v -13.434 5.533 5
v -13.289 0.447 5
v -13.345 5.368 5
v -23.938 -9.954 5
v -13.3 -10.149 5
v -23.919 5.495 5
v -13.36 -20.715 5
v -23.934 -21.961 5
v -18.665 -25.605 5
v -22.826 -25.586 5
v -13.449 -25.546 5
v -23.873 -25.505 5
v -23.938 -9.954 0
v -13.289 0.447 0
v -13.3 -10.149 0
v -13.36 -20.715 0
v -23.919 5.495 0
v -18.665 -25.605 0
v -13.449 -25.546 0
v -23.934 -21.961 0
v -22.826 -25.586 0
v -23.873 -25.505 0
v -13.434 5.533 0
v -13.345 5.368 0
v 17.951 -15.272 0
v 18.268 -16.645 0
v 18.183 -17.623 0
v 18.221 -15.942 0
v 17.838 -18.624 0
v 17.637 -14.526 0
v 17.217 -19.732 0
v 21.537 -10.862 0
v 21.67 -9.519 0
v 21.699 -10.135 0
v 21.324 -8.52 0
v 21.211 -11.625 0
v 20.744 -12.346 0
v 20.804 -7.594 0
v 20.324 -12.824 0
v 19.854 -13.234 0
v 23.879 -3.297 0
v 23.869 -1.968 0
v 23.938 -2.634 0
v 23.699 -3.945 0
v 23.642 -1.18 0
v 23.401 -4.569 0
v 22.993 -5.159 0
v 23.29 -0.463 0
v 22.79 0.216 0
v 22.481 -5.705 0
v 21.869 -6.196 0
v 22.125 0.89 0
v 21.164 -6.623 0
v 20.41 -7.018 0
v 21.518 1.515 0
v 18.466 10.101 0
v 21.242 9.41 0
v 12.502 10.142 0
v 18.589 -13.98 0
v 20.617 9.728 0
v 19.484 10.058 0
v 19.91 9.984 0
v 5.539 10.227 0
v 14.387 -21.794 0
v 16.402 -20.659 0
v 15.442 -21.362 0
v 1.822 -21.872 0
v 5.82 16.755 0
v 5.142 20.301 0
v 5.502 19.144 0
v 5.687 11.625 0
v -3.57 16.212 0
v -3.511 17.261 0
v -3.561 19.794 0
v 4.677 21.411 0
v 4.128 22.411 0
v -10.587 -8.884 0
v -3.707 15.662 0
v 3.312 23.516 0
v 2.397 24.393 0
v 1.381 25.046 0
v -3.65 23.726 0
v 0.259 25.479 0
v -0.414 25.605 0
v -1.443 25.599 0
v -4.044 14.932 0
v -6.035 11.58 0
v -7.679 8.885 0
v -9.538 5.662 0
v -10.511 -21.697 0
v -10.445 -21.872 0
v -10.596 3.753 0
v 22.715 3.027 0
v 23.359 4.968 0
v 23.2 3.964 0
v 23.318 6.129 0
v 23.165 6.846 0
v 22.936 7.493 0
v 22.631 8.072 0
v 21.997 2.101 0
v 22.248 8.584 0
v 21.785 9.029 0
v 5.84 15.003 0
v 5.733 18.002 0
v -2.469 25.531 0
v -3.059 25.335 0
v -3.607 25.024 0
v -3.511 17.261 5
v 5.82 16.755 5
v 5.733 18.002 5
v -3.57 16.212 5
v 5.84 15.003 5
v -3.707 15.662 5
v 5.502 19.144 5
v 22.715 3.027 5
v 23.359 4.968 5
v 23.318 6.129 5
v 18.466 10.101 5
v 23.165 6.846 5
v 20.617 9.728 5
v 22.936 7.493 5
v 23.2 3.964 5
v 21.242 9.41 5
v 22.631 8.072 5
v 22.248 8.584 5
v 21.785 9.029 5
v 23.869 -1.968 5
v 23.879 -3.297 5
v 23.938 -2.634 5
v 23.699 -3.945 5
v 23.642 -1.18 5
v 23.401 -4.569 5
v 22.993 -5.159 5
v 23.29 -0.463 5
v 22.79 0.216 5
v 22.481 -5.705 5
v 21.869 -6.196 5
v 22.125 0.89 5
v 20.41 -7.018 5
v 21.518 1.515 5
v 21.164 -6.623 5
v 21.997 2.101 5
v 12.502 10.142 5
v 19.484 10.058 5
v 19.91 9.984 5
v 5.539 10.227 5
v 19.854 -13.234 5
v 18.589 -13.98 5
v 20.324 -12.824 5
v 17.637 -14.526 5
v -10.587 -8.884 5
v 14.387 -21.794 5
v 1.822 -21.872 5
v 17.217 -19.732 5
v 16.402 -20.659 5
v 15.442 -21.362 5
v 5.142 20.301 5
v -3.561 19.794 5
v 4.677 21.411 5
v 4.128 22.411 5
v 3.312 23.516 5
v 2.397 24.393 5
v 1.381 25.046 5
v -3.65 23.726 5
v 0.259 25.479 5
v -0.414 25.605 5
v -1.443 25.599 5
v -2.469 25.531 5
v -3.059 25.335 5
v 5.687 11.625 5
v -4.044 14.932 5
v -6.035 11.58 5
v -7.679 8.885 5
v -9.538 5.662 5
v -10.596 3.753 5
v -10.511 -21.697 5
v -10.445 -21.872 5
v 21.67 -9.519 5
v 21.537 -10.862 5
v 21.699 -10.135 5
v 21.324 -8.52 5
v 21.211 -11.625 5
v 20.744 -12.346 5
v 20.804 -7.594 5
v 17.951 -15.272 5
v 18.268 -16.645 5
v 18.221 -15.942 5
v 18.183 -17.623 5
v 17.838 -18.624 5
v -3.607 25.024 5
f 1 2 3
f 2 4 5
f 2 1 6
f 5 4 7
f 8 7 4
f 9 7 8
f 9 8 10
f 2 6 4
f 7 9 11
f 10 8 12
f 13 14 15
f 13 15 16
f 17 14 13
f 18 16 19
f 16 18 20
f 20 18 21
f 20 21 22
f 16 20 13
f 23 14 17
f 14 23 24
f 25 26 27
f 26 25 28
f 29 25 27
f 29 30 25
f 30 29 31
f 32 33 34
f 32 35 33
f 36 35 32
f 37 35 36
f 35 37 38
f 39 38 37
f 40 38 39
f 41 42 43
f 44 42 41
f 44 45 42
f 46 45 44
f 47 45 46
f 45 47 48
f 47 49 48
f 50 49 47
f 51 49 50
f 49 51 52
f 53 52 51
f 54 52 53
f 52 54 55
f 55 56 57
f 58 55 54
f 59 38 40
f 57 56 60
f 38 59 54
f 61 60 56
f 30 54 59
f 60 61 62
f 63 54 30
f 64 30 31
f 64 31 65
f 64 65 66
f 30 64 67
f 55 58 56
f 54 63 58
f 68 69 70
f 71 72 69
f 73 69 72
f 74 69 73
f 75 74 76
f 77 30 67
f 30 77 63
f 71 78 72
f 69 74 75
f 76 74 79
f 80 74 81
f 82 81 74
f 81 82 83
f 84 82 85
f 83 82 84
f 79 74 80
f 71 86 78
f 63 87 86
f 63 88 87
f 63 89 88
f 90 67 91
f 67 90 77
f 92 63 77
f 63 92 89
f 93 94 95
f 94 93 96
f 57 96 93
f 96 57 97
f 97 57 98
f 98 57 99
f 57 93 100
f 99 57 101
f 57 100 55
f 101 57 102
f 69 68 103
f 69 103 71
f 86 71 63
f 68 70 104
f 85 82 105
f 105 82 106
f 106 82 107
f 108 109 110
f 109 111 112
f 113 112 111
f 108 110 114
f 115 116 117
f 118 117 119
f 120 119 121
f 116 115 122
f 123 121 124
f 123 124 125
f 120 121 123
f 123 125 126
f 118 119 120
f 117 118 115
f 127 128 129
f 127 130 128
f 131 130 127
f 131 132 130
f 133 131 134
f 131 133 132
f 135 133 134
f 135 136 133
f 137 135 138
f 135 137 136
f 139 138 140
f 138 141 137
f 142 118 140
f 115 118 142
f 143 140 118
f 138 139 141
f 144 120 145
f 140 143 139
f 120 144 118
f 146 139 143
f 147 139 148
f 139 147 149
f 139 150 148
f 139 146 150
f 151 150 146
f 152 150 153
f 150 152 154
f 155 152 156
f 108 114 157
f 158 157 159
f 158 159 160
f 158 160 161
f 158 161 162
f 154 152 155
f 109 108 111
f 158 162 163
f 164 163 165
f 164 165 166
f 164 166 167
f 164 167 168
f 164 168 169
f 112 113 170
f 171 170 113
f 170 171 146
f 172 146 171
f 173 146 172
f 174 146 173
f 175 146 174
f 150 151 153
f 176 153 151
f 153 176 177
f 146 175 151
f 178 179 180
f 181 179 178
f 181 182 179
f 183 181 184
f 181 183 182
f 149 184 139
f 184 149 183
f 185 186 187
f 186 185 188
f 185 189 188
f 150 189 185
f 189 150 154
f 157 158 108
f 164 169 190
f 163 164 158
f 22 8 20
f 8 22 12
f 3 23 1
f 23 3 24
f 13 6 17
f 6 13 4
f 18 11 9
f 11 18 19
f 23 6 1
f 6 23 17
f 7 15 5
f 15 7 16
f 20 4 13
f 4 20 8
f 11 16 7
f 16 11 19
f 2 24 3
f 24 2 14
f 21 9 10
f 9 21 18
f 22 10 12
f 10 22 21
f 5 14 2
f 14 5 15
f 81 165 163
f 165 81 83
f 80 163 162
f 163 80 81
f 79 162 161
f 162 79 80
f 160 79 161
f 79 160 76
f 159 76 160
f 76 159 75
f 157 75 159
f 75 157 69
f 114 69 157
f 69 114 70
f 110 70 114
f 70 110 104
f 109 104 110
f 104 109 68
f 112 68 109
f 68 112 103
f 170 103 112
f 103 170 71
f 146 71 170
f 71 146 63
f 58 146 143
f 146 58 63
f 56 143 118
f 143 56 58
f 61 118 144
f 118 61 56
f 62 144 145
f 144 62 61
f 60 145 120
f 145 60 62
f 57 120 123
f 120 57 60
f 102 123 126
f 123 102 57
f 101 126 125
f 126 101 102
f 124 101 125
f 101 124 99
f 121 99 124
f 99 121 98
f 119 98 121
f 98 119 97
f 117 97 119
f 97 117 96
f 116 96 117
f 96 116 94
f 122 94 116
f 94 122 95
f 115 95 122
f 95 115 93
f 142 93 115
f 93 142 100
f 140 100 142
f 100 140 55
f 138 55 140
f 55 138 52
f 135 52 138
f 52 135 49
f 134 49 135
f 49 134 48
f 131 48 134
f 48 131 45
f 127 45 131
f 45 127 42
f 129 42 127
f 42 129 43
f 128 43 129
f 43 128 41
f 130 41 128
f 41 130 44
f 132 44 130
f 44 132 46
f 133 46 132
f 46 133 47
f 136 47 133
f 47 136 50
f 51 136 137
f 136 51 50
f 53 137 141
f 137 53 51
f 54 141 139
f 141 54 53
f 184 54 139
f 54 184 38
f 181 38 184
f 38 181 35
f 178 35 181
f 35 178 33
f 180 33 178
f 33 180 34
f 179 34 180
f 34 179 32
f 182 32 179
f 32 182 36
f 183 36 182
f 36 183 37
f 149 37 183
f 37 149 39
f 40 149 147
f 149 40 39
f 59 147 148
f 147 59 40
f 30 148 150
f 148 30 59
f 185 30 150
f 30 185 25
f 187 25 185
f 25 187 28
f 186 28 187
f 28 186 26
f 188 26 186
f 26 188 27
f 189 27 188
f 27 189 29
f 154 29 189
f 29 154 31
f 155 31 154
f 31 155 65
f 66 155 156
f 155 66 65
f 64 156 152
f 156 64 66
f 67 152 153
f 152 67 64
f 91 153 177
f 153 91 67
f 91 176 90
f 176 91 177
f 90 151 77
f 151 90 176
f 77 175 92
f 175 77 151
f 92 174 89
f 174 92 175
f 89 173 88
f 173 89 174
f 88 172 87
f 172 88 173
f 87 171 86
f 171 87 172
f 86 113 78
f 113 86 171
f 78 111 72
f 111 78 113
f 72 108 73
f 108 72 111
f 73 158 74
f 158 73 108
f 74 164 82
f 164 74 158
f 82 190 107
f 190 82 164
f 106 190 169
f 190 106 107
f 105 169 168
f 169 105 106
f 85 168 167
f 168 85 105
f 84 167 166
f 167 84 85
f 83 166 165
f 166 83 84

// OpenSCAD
// Module names are of the form poly_<inkscape-path-id>().  As a result,
// you can associate a polygon in this OpenSCAD program with the corresponding
// SVG element in the Inkscape document by looking for the XML element with
// the attribute id="inkscape-path-id".

// fudge value is used to ensure that subtracted solids are a tad taller
// in the z dimension than the polygon being subtracted from.  This helps
// keep the resulting .stl file manifold.
fudge = 0.1;

module poly_path3776(h)
{
  scale([25.4/90, -25.4/90, 1]) union()
  {
    linear_extrude(height=h)
      polygon([[-84.498884,90.134308],[-84.556724,35.299408],[-84.488874,-19.204752],[-66.261945,-19.272752],[-51.736483,-19.258544],[-47.639022,-19.012092],[-47.433707,-17.104320],[-47.332084,-9.592100],[-47.375492,35.593598],[-47.691632,90.167828],[-53.536814,90.417914],[-66.135700,90.491575],[-78.714364,90.394987],[-84.498878,90.134328]]);
    linear_extrude(height=h)
      polygon([[-36.938332,76.772848],[-37.128462,31.330658],[-37.128462,-13.648502],[-33.331432,-20.395382],[-23.641552,-36.799552],[-16.034376,-49.370238],[-13.425342,-54.096598],[-12.654847,-56.159504],[-12.262227,-58.775580],[-12.346962,-69.411621],[-12.659322,-83.655936],[-12.631448,-86.704873],[-12.389901,-88.311817],[-11.686548,-89.108392],[-10.273252,-89.726226],[-8.141508,-90.226960],[-5.248425,-90.478640],[-2.208766,-90.457387],[0.362708,-90.139325],[3.470469,-89.133929],[6.425623,-87.555770],[9.194504,-85.444220],[11.743451,-82.838652],[14.038800,-79.778437],[16.046888,-76.302948],[17.734052,-72.451556],[19.066628,-68.263634],[20.182475,-62.368259],[20.418408,-53.624465],[20.304545,-46.701287],[19.881038,-41.288095],[19.472398,-36.094772],[24.555194,-35.811850],[44.285288,-35.684142],[68.969458,-35.608942],[71.086118,-34.882742],[74.413265,-33.470469],[77.077813,-31.712980],[79.175810,-29.530817],[80.803308,-26.844522],[81.905928,-23.725402],[82.483335,-20.271699],[82.500533,-16.885920],[81.922528,-13.970572],[80.146776,-10.704945],[77.309618,-7.089992],[75.650948,-5.293962],[78.315228,-2.780622],[82.057998,1.376468],[83.509428,4.214344],[84.326834,7.248962],[84.482194,10.304886],[83.947488,13.206678],[82.511654,16.422484],[80.390488,19.211651],[77.543546,21.616461],[73.930388,23.679198],[72.012158,24.728628],[73.332088,26.803238],[75.244740,30.089832],[76.388688,33.358268],[76.694958,35.148117],[76.385688,37.062428],[75.489446,39.787998],[74.099479,42.384192],[72.290728,44.735104],[70.138138,46.724828],[66.979041,48.652857],[62.928188,50.609168],[61.956668,51.167498],[62.852938,53.099668],[63.949427,55.620260],[64.495370,57.864592],[64.524522,60.095370],[64.070638,62.575298],[63.254984,65.103456],[62.144169,67.495686],[60.772999,69.713350],[59.176280,71.717805],[57.388819,73.470410],[55.445420,74.932525],[53.380891,76.065508],[51.230038,76.830718],[42.564728,77.166701],[6.462558,77.235848],[-30.510634,77.168708],[-35.834474,77.030092],[-36.939662,76.772828]]);
  }
}

module poly_path3774(h)
{
  scale([25.4/90, -25.4/90, 1]) union()
  {
    linear_extrude(height=h)
      polygon([[-84.459882,89.783738],[-84.613533,35.432048],[-84.407382,-18.734752],[-80.434625,-18.994767],[-66.116549,-19.079762],[-47.804812,-18.874442],[-47.645012,35.710148],[-47.711812,90.068158],[-66.005214,90.136058],[-81.369191,90.125125],[-83.836653,90.007413],[-84.459901,89.783688]]);
    linear_extrude(height=h)
      polygon([[-36.815992,76.798688],[-36.996172,31.583698],[-36.996172,-13.451112],[-35.380432,-16.327932],[-31.717702,-22.918262],[-22.178502,-38.925552],[-13.545372,-53.600589],[-12.626420,-55.859496],[-12.142931,-58.337613],[-12.132332,-67.359513],[-12.618722,-84.271937],[-12.577894,-87.305627],[-12.365162,-88.292954],[-10.452880,-89.402569],[-7.437662,-90.215793],[-3.737748,-90.479721],[-0.206958,-90.106425],[3.137039,-89.107084],[6.276571,-87.492876],[9.193971,-85.274981],[11.871566,-82.464577],[14.291689,-79.072845],[16.436668,-75.110963],[18.485396,-69.762851],[19.865118,-63.737753],[20.302233,-59.318794],[20.456326,-53.668815],[20.325365,-47.800722],[19.907318,-42.727418],[19.227818,-37.270532],[19.059438,-35.757142],[43.352998,-35.670842],[59.101550,-35.594160],[67.312606,-35.356189],[71.212721,-34.725439],[74.028448,-33.470422],[76.029164,-32.308538],[77.754857,-30.923239],[79.204628,-29.316211],[80.377574,-27.489140],[81.272796,-25.443715],[81.889392,-23.181620],[82.283108,-18.014172],[82.072764,-15.172179],[81.351798,-13.190932],[79.703754,-10.272129],[77.333438,-7.390272],[75.716358,-5.381972],[78.727318,-2.115242],[80.843088,0.154713],[82.317069,2.150460],[83.326142,4.157113],[84.047188,6.459788],[84.402374,8.856854],[84.283308,11.231972],[83.709284,13.550831],[82.699595,15.779122],[81.273535,17.882534],[79.450398,19.826756],[77.249478,21.577477],[74.690068,23.100388],[71.747608,24.705818],[73.212318,26.932438],[74.911397,29.720017],[75.977293,32.254077],[76.430161,34.599391],[76.290158,36.820728],[75.668102,38.988411],[74.672786,41.110777],[73.321931,43.156342],[71.633258,45.093618],[69.213930,47.239295],[65.712968,49.105198],[62.807994,50.614383],[61.966488,51.391838],[62.618238,53.000478],[63.925297,56.084114],[64.335473,59.358602],[63.848521,62.845495],[62.464198,66.566348],[60.732153,69.543729],[58.571330,72.156242],[56.047586,74.336514],[53.226778,76.017168],[51.506988,76.838958],[7.435598,76.908858],[-36.815962,76.798618]]);
  }
}

module poly_path3770(h)
{
  scale([25.4/90, -25.4/90, 1]) union()
  {
    linear_extrude(height=h)
      polygon([[-84.092005,35.563998],[-84.092005,-18.811552],[-66.034193,-18.743552],[-47.976382,-18.675552],[-47.976382,35.564038],[-47.976382,89.803618],[-66.034193,89.871618],[-84.092005,89.939618]]);
    linear_extrude(height=h)
      polygon([[-36.596272,75.849888],[-36.674972,30.669198],[-36.599272,-13.648502],[-32.865902,-20.263092],[-26.146662,-31.772462],[-13.290002,-53.255221],[-12.312993,-55.537670],[-11.819096,-58.162264],[-11.706572,-62.256137],[-11.873682,-68.946423],[-12.225422,-83.450913],[-12.234929,-86.456341],[-12.046104,-87.977760],[-11.414150,-88.677641],[-10.094272,-89.218459],[-7.721293,-89.803867],[-4.770346,-90.043479],[-1.696112,-89.927934],[1.046728,-89.447869],[4.145233,-88.287169],[7.047621,-86.573394],[9.732508,-84.333996],[12.178506,-81.596428],[14.364232,-78.388142],[16.268300,-74.736590],[17.869323,-70.669225],[19.145918,-66.213499],[19.620321,-62.811798],[19.816558,-55.188089],[19.821538,-47.007224],[19.343398,-41.074429],[18.921464,-36.618448],[19.119698,-35.456082],[43.382198,-35.216102],[66.961060,-34.994135],[70.873603,-34.443228],[73.543348,-33.350972],[76.204450,-31.744493],[78.427178,-29.635180],[80.170903,-27.070908],[81.394998,-24.099552],[81.983878,-19.733922],[81.898339,-16.394364],[81.165006,-13.519877],[79.642687,-10.757634],[77.190188,-7.754812],[75.187178,-5.349322],[77.943738,-2.474022],[81.446368,1.387357],[82.487455,3.106559],[83.283428,5.004618],[83.839379,7.045170],[84.001828,9.237948],[83.768137,12.026722],[82.976593,14.533166],[81.560111,16.905543],[79.451608,19.292118],[77.069785,21.387078],[74.327288,22.936248],[71.483018,24.637698],[72.771668,26.814398],[74.769091,30.133242],[75.871818,33.158768],[76.174605,34.890265],[75.991618,36.542958],[75.310495,38.979885],[74.251293,41.239778],[72.792272,43.360441],[70.911698,45.379678],[68.357084,47.407618],[64.545508,49.334578],[61.572198,50.976398],[62.321158,53.105748],[63.791924,56.730816],[63.990938,59.884298],[63.605699,62.415451],[62.845006,64.902414],[61.746330,67.292787],[60.347140,69.534170],[58.684908,71.574161],[56.797103,73.360360],[54.721196,74.840366],[52.494658,75.961778],[50.977808,76.574408],[7.267978,76.643608],[-36.441852,76.712808]]);
  }
}

module poly_path3772(h)
{
  scale([25.4/90, -25.4/90, 1]) union()
  {
    linear_extrude(height=h)
      polygon([[-84.233597,89.871558],[-84.292147,35.299408],[-84.224297,-18.940172],[-66.039691,-19.008172],[-47.855082,-19.076172],[-47.687322,-18.407732],[-47.747922,36.164408],[-47.976342,90.068098],[-66.041752,90.136098],[-80.467181,90.122862],[-84.233557,89.871508]]);
    linear_extrude(height=h)
      polygon([[-36.671992,76.512848],[-36.863882,31.330658],[-36.863882,-13.383922],[-33.191992,-19.998502],[-25.809212,-32.686762],[-13.213832,-53.813751],[-12.399202,-55.940477],[-11.989900,-58.671984],[-12.079322,-70.470711],[-12.395992,-84.902205],[-12.389992,-88.422574],[-10.940962,-89.085961],[-7.516171,-90.029422],[-2.868842,-90.180680],[0.106771,-89.863648],[2.783481,-89.127402],[5.353053,-87.900173],[8.007248,-86.110195],[10.074666,-84.290574],[12.029769,-82.078232],[15.484341,-76.701811],[18.133577,-70.433792],[19.740088,-63.727035],[20.084508,-59.335276],[20.176065,-53.355043],[19.626048,-41.575176],[18.952548,-36.470522],[19.165598,-35.792762],[25.092629,-35.543485],[44.114638,-35.408352],[59.798080,-35.340216],[67.779511,-35.126895],[71.404341,-34.536765],[74.017978,-33.338202],[77.317090,-31.134138],[79.797280,-28.173099],[81.437969,-24.488277],[82.218578,-20.112862],[82.149761,-16.767382],[81.387924,-13.711478],[79.875204,-10.793186],[77.553738,-7.860542],[75.451678,-5.368152],[78.430598,-2.263352],[80.988083,0.422455],[82.391828,2.515468],[83.753993,5.942577],[84.176468,9.359688],[83.929436,12.131413],[83.154106,14.593822],[81.768080,16.929877],[79.688958,19.322538],[77.332428,21.448907],[74.591778,23.008148],[71.747508,24.762928],[72.939198,26.730268],[74.936864,30.079565],[76.103958,33.448458],[76.226555,36.259426],[75.477263,39.179212],[73.891915,42.117904],[71.506348,44.985588],[69.023008,47.203072],[65.574808,49.062828],[61.794098,51.161208],[62.730248,53.546328],[63.815726,56.164674],[64.264861,58.663815],[64.089665,61.267545],[63.302148,64.199658],[61.527604,68.074392],[59.086124,71.430372],[56.077008,74.156793],[52.599558,76.142848],[50.977708,76.838998],[7.248778,76.909698],[-30.242749,76.903327],[-35.582260,76.771983],[-36.672072,76.512828]]);
  }
}

module poly_path3768(h)
{
  scale([25.4/90, -25.4/90, 1]) union()
  {
    linear_extrude(height=h)
      polygon([[-83.827422,35.565858],[-83.827422,-18.543302],[-65.967412,-18.543302],[-48.107402,-18.543302],[-48.174202,35.497848],[-48.241002,89.538998],[-66.034233,89.606998],[-83.827462,89.674998]]);
    linear_extrude(height=h)
      polygon([[-36.336712,75.846808],[-36.407912,30.933788],[-36.334712,-13.383922],[-34.722712,-16.294342],[-26.139632,-31.243302],[-20.251252,-40.900589],[-14.729361,-50.072263],[-13.113192,-53.112326],[-12.096561,-55.640617],[-11.556735,-58.046197],[-11.370979,-60.718124],[-11.570742,-68.417256],[-11.943262,-87.001970],[-11.605841,-88.110133],[-10.401922,-88.803000],[-6.373812,-89.733611],[-3.754005,-89.873386],[-1.195424,-89.655279],[1.289044,-89.085250],[3.686510,-88.169263],[5.984087,-86.913279],[8.168885,-85.323260],[10.228018,-83.405169],[12.148598,-81.164968],[14.544188,-77.467401],[16.383698,-73.968714],[17.325348,-71.442229],[18.627515,-66.990734],[19.507958,-61.934964],[19.866145,-53.239755],[19.481458,-44.472464],[18.724888,-37.489824],[18.791158,-35.410522],[41.369588,-35.186282],[66.455898,-34.941422],[69.961605,-34.329461],[73.069073,-33.282674],[75.717466,-31.827509],[77.845948,-29.990412],[79.538606,-27.693457],[80.775080,-25.023420],[81.534783,-22.038606],[81.797128,-18.797322],[81.581876,-16.002077],[80.846298,-13.510874],[79.473654,-11.049660],[77.347208,-8.344382],[75.699184,-6.442208],[75.205555,-5.266013],[75.946152,-4.038932],[78.000808,-1.984102],[80.736092,1.027855],[82.516531,3.750853],[83.475757,6.449334],[83.747398,9.387738],[83.564968,11.634477],[83.022816,13.673863],[82.065426,15.654742],[80.637278,17.725958],[77.858264,20.482903],[73.930378,22.793778],[72.090710,23.746093],[71.311070,24.512562],[71.466864,25.429382],[72.433498,26.832748],[74.496969,30.273201],[75.712318,33.717268],[75.811055,35.915811],[75.305590,38.281982],[74.224114,40.730239],[72.594818,43.175038],[69.995311,45.827267],[67.381938,47.715418],[64.005568,49.287838],[61.260168,50.909188],[62.019368,53.105978],[63.516268,56.688320],[63.725508,59.884298],[63.304786,62.528805],[62.464205,65.124363],[61.253570,67.605806],[59.722686,69.907970],[57.921360,71.965688],[55.899396,73.713795],[53.706600,75.087127],[51.392778,76.020518],[49.326952,76.245921],[43.141340,76.373121],[6.881678,76.442118],[-36.192352,76.442118]]);
  }
}

module poly_path3766(h)
{
  scale([25.4/90, -25.4/90, 1]) union()
  {
    difference()
    {
       linear_extrude(height=h)
         polygon([[-83.827422,35.565858],[-83.827422,-18.543302],[-65.967412,-18.543302],[-48.107402,-18.543302],[-48.174202,35.497848],[-48.241002,89.538998],[-66.034233,89.606998],[-83.827462,89.674998]]);
       translate([0, 0, -fudge])
         linear_extrude(height=h+2*fudge)
           polygon([[-48.802702,89.194658],[-48.590642,-2.868642],[-48.637842,-18.282522],[-66.034193,-18.214522],[-83.430547,-18.146522],[-83.499807,35.414068],[-83.488541,78.319245],[-83.235224,89.190158],[-65.927530,89.388550],[-48.802702,89.194158]]);
    }
    difference()
    {
       linear_extrude(height=h)
         polygon([[-36.336712,75.846808],[-36.407912,30.933788],[-36.334712,-13.383922],[-34.722712,-16.294342],[-26.139632,-31.243302],[-20.251252,-40.900589],[-14.729361,-50.072263],[-13.113192,-53.112326],[-12.096561,-55.640617],[-11.556735,-58.046197],[-11.370979,-60.718124],[-11.570742,-68.417256],[-11.943262,-87.001970],[-11.605841,-88.110133],[-10.401922,-88.803000],[-6.373812,-89.733611],[-3.754005,-89.873386],[-1.195424,-89.655279],[1.289044,-89.085250],[3.686510,-88.169263],[5.984087,-86.913279],[8.168885,-85.323260],[10.228018,-83.405169],[12.148598,-81.164968],[14.544188,-77.467401],[16.383698,-73.968714],[17.325348,-71.442229],[18.627515,-66.990734],[19.507958,-61.934964],[19.866145,-53.239755],[19.481458,-44.472464],[18.724888,-37.489824],[18.791158,-35.410522],[41.369588,-35.186282],[66.455898,-34.941422],[69.961605,-34.329461],[73.069073,-33.282674],[75.717466,-31.827509],[77.845948,-29.990412],[79.538606,-27.693457],[80.775080,-25.023420],[81.534783,-22.038606],[81.797128,-18.797322],[81.581876,-16.002077],[80.846298,-13.510874],[79.473654,-11.049660],[77.347208,-8.344382],[75.699184,-6.442208],[75.205555,-5.266013],[75.946152,-4.038932],[78.000808,-1.984102],[80.736092,1.027855],[82.516531,3.750853],[83.475757,6.449334],[83.747398,9.387738],[83.564968,11.634477],[83.022816,13.673863],[82.065426,15.654742],[80.637278,17.725958],[77.858264,20.482903],[73.930378,22.793778],[72.090710,23.746093],[71.311070,24.512562],[71.466864,25.429382],[72.433498,26.832748],[74.496969,30.273201],[75.712318,33.717268],[75.811055,35.915811],[75.305590,38.281982],[74.224114,40.730239],[72.594818,43.175038],[69.995311,45.827267],[67.381938,47.715418],[64.005568,49.287838],[61.260168,50.909188],[62.019368,53.105978],[63.516268,56.688320],[63.725508,59.884298],[63.304786,62.528805],[62.464205,65.124363],[61.253570,67.605806],[59.722686,69.907970],[57.921360,71.965688],[55.899396,73.713795],[53.706600,75.087127],[51.392778,76.020518],[49.326952,76.245921],[43.141340,76.373121],[6.881678,76.442118],[-36.192352,76.442118]]);
       translate([0, 0, -fudge])
         linear_extrude(height=h+2*fudge)
           polygon([[50.316328,75.885408],[52.488428,75.105128],[53.699078,74.590018],[54.814248,73.928558],[55.720258,73.264278],[57.237509,72.097891],[59.356958,69.827518],[60.923109,67.381511],[62.259228,64.398497],[63.190744,61.343324],[63.543088,58.680838],[62.921731,56.113213],[62.391955,54.962280],[61.938598,54.481678],[61.693408,53.873138],[61.416838,52.988028],[61.086118,51.572498],[61.231998,50.468387],[62.487158,49.557498],[64.373008,48.671148],[65.118888,48.280978],[66.275758,47.716608],[67.619744,47.117392],[69.384398,45.684288],[70.386298,44.956678],[71.972305,43.223888],[73.992518,40.360818],[74.542281,39.224453],[74.437198,38.578468],[74.155261,37.984547],[74.566528,37.908478],[74.984355,37.699273],[75.255373,37.018663],[75.319558,34.416658],[74.568308,31.316453],[72.326118,27.376668],[71.309680,25.602372],[70.992344,24.368842],[71.378652,23.540333],[72.473148,22.981098],[75.336175,21.696478],[77.651598,20.066948],[78.936278,19.027518],[81.984938,15.087808],[82.958596,12.383560],[83.389248,9.184858],[83.168085,7.141113],[82.576136,4.979401],[81.720711,3.006280],[80.709118,1.528308],[79.949658,0.590638],[78.117928,-1.080822],[77.832998,-1.366422],[76.245498,-3.176732],[75.026355,-4.505715],[74.657998,-5.382622],[74.345808,-6.167862],[74.216648,-6.748882],[74.441614,-7.071753],[74.803778,-6.890452],[75.373053,-6.877504],[76.516348,-7.985132],[77.828918,-9.726722],[78.471698,-10.540642],[79.540458,-11.948912],[80.525048,-13.913112],[81.263056,-16.559075],[81.355378,-19.978318],[80.840222,-23.539957],[79.755798,-26.613112],[78.221589,-28.875514],[76.917248,-30.184982],[76.299598,-30.833372],[75.522576,-31.586037],[73.762778,-32.551522],[71.080382,-33.758791],[67.444098,-34.355573],[43.730218,-34.680182],[19.020168,-34.815192],[18.535658,-35.476652],[18.191570,-36.216580],[18.276738,-37.196442],[18.989963,-43.739662],[19.207708,-54.394359],[19.102656,-62.396824],[18.590198,-65.639151],[17.782028,-68.901577],[17.275058,-70.211265],[16.978828,-70.950101],[15.659266,-74.387340],[13.870738,-77.599670],[13.539248,-78.267327],[12.681678,-79.756286],[11.557198,-81.235870],[9.041328,-83.881704],[6.861291,-85.855932],[4.846968,-87.136547],[2.452488,-88.128734],[1.725258,-88.406886],[-0.388684,-89.134288],[-3.923252,-89.432739],[-7.392197,-89.217233],[-10.140962,-88.473127],[-11.241951,-87.922314],[-11.523212,-87.190175],[-11.322992,-73.047484],[-11.071332,-61.889921],[-11.178135,-57.529275],[-11.888252,-54.878462],[-12.997722,-52.188970],[-15.829502,-47.115680],[-16.681862,-45.768953],[-20.062842,-40.366958],[-20.847402,-39.103172],[-21.905102,-37.303972],[-23.283732,-35.281422],[-24.046462,-33.954472],[-24.860462,-32.489782],[-25.354502,-31.670892],[-25.859872,-30.867982],[-26.540202,-29.702492],[-27.315012,-28.332902],[-30.115332,-23.702692],[-31.663232,-20.924572],[-32.997272,-18.543322],[-33.505402,-17.617272],[-34.905502,-14.972112],[-36.008752,-12.856122],[-35.969352,31.427778],[-35.785002,75.946178],[6.648880,76.168405],[50.316318,75.885378]]);
       translate([0, 0, -fudge])
         linear_extrude(height=h+2*fudge)
           polygon([[74.657998,-3.197482],[74.938188,-3.462072],[75.054868,-3.197482],[74.774678,-2.932902],[74.657998,-3.197482]]);
    }
  }
}

module poly_path3778(h)
{
  scale([25.4/90, -25.4/90, 1]) union()
  {
    linear_extrude(height=h)
      polygon([[-84.589406,90.371018],[-84.805277,77.813373],[-84.820239,35.271538],[-84.753469,-19.469342],[-66.176753,-19.537242],[-47.600032,-19.605142],[-47.287072,-19.020362],[-47.085280,-1.584062],[-47.124494,35.960110],[-47.336892,73.398421],[-47.654652,90.517138],[-66.134094,90.725628],[-80.879693,90.660272],[-84.589411,90.371078]]);
    linear_extrude(height=h)
      polygon([[-37.245372,76.879468],[-37.513862,31.480218],[-37.546262,-13.298042],[-33.796462,-20.061612],[-27.210572,-31.481632],[-21.385022,-41.032881],[-14.328149,-52.908803],[-13.135894,-55.494011],[-12.648752,-57.445297],[-12.439586,-61.161459],[-12.618852,-70.137048],[-12.933099,-84.067175],[-12.780732,-88.667750],[-10.837532,-89.768594],[-8.747997,-90.465515],[-5.113912,-90.704637],[-1.466327,-90.725628],[0.916338,-90.278187],[4.893482,-88.745425],[8.494396,-86.430824],[11.733689,-83.322805],[14.625968,-79.409786],[16.570831,-75.866100],[18.220661,-71.933828],[19.495048,-67.833851],[20.313578,-63.787048],[20.623513,-59.369535],[20.692839,-53.159769],[20.151468,-41.189416],[19.624628,-36.237542],[44.297028,-35.937462],[65.431991,-35.791552],[69.038966,-35.637933],[70.547368,-35.376212],[73.053396,-34.469501],[75.266385,-33.343399],[77.190457,-31.993240],[78.829739,-30.414359],[80.188354,-28.602090],[81.270427,-26.551768],[82.080084,-24.258727],[82.621448,-21.718302],[82.769125,-17.602343],[82.204918,-14.045382],[80.486715,-10.725548],[77.941308,-7.444332],[76.245468,-5.369562],[78.395018,-3.152772],[80.753493,-0.766391],[82.522149,1.639011],[83.772069,4.179919],[84.574338,6.972818],[84.820239,9.333980],[84.612272,11.680875],[83.971128,13.977884],[82.917500,16.189388],[81.472081,18.279767],[79.655562,20.213402],[77.488637,21.954672],[74.991998,23.467958],[72.317698,24.865678],[73.715038,26.907538],[75.556423,30.190420],[76.781878,33.729058],[76.884808,35.910359],[76.313654,38.487178],[75.156887,41.189217],[73.502978,43.746178],[72.015593,45.438463],[70.347461,46.891376],[65.866598,49.535738],[62.493168,51.468518],[63.604198,54.114348],[64.563690,56.489053],[64.728678,58.979618],[64.427501,62.445096],[63.206158,65.991078],[61.006874,69.914917],[58.118940,73.202122],[54.717515,75.691806],[50.977758,77.223078],[6.455048,77.498978],[-37.009302,77.499978]]);
  }
}

poly_path3776(5);
poly_path3774(5);
poly_path3770(5);
poly_path3772(5);
poly_path3768(5);
poly_path3766(5);
poly_path3778(5);
